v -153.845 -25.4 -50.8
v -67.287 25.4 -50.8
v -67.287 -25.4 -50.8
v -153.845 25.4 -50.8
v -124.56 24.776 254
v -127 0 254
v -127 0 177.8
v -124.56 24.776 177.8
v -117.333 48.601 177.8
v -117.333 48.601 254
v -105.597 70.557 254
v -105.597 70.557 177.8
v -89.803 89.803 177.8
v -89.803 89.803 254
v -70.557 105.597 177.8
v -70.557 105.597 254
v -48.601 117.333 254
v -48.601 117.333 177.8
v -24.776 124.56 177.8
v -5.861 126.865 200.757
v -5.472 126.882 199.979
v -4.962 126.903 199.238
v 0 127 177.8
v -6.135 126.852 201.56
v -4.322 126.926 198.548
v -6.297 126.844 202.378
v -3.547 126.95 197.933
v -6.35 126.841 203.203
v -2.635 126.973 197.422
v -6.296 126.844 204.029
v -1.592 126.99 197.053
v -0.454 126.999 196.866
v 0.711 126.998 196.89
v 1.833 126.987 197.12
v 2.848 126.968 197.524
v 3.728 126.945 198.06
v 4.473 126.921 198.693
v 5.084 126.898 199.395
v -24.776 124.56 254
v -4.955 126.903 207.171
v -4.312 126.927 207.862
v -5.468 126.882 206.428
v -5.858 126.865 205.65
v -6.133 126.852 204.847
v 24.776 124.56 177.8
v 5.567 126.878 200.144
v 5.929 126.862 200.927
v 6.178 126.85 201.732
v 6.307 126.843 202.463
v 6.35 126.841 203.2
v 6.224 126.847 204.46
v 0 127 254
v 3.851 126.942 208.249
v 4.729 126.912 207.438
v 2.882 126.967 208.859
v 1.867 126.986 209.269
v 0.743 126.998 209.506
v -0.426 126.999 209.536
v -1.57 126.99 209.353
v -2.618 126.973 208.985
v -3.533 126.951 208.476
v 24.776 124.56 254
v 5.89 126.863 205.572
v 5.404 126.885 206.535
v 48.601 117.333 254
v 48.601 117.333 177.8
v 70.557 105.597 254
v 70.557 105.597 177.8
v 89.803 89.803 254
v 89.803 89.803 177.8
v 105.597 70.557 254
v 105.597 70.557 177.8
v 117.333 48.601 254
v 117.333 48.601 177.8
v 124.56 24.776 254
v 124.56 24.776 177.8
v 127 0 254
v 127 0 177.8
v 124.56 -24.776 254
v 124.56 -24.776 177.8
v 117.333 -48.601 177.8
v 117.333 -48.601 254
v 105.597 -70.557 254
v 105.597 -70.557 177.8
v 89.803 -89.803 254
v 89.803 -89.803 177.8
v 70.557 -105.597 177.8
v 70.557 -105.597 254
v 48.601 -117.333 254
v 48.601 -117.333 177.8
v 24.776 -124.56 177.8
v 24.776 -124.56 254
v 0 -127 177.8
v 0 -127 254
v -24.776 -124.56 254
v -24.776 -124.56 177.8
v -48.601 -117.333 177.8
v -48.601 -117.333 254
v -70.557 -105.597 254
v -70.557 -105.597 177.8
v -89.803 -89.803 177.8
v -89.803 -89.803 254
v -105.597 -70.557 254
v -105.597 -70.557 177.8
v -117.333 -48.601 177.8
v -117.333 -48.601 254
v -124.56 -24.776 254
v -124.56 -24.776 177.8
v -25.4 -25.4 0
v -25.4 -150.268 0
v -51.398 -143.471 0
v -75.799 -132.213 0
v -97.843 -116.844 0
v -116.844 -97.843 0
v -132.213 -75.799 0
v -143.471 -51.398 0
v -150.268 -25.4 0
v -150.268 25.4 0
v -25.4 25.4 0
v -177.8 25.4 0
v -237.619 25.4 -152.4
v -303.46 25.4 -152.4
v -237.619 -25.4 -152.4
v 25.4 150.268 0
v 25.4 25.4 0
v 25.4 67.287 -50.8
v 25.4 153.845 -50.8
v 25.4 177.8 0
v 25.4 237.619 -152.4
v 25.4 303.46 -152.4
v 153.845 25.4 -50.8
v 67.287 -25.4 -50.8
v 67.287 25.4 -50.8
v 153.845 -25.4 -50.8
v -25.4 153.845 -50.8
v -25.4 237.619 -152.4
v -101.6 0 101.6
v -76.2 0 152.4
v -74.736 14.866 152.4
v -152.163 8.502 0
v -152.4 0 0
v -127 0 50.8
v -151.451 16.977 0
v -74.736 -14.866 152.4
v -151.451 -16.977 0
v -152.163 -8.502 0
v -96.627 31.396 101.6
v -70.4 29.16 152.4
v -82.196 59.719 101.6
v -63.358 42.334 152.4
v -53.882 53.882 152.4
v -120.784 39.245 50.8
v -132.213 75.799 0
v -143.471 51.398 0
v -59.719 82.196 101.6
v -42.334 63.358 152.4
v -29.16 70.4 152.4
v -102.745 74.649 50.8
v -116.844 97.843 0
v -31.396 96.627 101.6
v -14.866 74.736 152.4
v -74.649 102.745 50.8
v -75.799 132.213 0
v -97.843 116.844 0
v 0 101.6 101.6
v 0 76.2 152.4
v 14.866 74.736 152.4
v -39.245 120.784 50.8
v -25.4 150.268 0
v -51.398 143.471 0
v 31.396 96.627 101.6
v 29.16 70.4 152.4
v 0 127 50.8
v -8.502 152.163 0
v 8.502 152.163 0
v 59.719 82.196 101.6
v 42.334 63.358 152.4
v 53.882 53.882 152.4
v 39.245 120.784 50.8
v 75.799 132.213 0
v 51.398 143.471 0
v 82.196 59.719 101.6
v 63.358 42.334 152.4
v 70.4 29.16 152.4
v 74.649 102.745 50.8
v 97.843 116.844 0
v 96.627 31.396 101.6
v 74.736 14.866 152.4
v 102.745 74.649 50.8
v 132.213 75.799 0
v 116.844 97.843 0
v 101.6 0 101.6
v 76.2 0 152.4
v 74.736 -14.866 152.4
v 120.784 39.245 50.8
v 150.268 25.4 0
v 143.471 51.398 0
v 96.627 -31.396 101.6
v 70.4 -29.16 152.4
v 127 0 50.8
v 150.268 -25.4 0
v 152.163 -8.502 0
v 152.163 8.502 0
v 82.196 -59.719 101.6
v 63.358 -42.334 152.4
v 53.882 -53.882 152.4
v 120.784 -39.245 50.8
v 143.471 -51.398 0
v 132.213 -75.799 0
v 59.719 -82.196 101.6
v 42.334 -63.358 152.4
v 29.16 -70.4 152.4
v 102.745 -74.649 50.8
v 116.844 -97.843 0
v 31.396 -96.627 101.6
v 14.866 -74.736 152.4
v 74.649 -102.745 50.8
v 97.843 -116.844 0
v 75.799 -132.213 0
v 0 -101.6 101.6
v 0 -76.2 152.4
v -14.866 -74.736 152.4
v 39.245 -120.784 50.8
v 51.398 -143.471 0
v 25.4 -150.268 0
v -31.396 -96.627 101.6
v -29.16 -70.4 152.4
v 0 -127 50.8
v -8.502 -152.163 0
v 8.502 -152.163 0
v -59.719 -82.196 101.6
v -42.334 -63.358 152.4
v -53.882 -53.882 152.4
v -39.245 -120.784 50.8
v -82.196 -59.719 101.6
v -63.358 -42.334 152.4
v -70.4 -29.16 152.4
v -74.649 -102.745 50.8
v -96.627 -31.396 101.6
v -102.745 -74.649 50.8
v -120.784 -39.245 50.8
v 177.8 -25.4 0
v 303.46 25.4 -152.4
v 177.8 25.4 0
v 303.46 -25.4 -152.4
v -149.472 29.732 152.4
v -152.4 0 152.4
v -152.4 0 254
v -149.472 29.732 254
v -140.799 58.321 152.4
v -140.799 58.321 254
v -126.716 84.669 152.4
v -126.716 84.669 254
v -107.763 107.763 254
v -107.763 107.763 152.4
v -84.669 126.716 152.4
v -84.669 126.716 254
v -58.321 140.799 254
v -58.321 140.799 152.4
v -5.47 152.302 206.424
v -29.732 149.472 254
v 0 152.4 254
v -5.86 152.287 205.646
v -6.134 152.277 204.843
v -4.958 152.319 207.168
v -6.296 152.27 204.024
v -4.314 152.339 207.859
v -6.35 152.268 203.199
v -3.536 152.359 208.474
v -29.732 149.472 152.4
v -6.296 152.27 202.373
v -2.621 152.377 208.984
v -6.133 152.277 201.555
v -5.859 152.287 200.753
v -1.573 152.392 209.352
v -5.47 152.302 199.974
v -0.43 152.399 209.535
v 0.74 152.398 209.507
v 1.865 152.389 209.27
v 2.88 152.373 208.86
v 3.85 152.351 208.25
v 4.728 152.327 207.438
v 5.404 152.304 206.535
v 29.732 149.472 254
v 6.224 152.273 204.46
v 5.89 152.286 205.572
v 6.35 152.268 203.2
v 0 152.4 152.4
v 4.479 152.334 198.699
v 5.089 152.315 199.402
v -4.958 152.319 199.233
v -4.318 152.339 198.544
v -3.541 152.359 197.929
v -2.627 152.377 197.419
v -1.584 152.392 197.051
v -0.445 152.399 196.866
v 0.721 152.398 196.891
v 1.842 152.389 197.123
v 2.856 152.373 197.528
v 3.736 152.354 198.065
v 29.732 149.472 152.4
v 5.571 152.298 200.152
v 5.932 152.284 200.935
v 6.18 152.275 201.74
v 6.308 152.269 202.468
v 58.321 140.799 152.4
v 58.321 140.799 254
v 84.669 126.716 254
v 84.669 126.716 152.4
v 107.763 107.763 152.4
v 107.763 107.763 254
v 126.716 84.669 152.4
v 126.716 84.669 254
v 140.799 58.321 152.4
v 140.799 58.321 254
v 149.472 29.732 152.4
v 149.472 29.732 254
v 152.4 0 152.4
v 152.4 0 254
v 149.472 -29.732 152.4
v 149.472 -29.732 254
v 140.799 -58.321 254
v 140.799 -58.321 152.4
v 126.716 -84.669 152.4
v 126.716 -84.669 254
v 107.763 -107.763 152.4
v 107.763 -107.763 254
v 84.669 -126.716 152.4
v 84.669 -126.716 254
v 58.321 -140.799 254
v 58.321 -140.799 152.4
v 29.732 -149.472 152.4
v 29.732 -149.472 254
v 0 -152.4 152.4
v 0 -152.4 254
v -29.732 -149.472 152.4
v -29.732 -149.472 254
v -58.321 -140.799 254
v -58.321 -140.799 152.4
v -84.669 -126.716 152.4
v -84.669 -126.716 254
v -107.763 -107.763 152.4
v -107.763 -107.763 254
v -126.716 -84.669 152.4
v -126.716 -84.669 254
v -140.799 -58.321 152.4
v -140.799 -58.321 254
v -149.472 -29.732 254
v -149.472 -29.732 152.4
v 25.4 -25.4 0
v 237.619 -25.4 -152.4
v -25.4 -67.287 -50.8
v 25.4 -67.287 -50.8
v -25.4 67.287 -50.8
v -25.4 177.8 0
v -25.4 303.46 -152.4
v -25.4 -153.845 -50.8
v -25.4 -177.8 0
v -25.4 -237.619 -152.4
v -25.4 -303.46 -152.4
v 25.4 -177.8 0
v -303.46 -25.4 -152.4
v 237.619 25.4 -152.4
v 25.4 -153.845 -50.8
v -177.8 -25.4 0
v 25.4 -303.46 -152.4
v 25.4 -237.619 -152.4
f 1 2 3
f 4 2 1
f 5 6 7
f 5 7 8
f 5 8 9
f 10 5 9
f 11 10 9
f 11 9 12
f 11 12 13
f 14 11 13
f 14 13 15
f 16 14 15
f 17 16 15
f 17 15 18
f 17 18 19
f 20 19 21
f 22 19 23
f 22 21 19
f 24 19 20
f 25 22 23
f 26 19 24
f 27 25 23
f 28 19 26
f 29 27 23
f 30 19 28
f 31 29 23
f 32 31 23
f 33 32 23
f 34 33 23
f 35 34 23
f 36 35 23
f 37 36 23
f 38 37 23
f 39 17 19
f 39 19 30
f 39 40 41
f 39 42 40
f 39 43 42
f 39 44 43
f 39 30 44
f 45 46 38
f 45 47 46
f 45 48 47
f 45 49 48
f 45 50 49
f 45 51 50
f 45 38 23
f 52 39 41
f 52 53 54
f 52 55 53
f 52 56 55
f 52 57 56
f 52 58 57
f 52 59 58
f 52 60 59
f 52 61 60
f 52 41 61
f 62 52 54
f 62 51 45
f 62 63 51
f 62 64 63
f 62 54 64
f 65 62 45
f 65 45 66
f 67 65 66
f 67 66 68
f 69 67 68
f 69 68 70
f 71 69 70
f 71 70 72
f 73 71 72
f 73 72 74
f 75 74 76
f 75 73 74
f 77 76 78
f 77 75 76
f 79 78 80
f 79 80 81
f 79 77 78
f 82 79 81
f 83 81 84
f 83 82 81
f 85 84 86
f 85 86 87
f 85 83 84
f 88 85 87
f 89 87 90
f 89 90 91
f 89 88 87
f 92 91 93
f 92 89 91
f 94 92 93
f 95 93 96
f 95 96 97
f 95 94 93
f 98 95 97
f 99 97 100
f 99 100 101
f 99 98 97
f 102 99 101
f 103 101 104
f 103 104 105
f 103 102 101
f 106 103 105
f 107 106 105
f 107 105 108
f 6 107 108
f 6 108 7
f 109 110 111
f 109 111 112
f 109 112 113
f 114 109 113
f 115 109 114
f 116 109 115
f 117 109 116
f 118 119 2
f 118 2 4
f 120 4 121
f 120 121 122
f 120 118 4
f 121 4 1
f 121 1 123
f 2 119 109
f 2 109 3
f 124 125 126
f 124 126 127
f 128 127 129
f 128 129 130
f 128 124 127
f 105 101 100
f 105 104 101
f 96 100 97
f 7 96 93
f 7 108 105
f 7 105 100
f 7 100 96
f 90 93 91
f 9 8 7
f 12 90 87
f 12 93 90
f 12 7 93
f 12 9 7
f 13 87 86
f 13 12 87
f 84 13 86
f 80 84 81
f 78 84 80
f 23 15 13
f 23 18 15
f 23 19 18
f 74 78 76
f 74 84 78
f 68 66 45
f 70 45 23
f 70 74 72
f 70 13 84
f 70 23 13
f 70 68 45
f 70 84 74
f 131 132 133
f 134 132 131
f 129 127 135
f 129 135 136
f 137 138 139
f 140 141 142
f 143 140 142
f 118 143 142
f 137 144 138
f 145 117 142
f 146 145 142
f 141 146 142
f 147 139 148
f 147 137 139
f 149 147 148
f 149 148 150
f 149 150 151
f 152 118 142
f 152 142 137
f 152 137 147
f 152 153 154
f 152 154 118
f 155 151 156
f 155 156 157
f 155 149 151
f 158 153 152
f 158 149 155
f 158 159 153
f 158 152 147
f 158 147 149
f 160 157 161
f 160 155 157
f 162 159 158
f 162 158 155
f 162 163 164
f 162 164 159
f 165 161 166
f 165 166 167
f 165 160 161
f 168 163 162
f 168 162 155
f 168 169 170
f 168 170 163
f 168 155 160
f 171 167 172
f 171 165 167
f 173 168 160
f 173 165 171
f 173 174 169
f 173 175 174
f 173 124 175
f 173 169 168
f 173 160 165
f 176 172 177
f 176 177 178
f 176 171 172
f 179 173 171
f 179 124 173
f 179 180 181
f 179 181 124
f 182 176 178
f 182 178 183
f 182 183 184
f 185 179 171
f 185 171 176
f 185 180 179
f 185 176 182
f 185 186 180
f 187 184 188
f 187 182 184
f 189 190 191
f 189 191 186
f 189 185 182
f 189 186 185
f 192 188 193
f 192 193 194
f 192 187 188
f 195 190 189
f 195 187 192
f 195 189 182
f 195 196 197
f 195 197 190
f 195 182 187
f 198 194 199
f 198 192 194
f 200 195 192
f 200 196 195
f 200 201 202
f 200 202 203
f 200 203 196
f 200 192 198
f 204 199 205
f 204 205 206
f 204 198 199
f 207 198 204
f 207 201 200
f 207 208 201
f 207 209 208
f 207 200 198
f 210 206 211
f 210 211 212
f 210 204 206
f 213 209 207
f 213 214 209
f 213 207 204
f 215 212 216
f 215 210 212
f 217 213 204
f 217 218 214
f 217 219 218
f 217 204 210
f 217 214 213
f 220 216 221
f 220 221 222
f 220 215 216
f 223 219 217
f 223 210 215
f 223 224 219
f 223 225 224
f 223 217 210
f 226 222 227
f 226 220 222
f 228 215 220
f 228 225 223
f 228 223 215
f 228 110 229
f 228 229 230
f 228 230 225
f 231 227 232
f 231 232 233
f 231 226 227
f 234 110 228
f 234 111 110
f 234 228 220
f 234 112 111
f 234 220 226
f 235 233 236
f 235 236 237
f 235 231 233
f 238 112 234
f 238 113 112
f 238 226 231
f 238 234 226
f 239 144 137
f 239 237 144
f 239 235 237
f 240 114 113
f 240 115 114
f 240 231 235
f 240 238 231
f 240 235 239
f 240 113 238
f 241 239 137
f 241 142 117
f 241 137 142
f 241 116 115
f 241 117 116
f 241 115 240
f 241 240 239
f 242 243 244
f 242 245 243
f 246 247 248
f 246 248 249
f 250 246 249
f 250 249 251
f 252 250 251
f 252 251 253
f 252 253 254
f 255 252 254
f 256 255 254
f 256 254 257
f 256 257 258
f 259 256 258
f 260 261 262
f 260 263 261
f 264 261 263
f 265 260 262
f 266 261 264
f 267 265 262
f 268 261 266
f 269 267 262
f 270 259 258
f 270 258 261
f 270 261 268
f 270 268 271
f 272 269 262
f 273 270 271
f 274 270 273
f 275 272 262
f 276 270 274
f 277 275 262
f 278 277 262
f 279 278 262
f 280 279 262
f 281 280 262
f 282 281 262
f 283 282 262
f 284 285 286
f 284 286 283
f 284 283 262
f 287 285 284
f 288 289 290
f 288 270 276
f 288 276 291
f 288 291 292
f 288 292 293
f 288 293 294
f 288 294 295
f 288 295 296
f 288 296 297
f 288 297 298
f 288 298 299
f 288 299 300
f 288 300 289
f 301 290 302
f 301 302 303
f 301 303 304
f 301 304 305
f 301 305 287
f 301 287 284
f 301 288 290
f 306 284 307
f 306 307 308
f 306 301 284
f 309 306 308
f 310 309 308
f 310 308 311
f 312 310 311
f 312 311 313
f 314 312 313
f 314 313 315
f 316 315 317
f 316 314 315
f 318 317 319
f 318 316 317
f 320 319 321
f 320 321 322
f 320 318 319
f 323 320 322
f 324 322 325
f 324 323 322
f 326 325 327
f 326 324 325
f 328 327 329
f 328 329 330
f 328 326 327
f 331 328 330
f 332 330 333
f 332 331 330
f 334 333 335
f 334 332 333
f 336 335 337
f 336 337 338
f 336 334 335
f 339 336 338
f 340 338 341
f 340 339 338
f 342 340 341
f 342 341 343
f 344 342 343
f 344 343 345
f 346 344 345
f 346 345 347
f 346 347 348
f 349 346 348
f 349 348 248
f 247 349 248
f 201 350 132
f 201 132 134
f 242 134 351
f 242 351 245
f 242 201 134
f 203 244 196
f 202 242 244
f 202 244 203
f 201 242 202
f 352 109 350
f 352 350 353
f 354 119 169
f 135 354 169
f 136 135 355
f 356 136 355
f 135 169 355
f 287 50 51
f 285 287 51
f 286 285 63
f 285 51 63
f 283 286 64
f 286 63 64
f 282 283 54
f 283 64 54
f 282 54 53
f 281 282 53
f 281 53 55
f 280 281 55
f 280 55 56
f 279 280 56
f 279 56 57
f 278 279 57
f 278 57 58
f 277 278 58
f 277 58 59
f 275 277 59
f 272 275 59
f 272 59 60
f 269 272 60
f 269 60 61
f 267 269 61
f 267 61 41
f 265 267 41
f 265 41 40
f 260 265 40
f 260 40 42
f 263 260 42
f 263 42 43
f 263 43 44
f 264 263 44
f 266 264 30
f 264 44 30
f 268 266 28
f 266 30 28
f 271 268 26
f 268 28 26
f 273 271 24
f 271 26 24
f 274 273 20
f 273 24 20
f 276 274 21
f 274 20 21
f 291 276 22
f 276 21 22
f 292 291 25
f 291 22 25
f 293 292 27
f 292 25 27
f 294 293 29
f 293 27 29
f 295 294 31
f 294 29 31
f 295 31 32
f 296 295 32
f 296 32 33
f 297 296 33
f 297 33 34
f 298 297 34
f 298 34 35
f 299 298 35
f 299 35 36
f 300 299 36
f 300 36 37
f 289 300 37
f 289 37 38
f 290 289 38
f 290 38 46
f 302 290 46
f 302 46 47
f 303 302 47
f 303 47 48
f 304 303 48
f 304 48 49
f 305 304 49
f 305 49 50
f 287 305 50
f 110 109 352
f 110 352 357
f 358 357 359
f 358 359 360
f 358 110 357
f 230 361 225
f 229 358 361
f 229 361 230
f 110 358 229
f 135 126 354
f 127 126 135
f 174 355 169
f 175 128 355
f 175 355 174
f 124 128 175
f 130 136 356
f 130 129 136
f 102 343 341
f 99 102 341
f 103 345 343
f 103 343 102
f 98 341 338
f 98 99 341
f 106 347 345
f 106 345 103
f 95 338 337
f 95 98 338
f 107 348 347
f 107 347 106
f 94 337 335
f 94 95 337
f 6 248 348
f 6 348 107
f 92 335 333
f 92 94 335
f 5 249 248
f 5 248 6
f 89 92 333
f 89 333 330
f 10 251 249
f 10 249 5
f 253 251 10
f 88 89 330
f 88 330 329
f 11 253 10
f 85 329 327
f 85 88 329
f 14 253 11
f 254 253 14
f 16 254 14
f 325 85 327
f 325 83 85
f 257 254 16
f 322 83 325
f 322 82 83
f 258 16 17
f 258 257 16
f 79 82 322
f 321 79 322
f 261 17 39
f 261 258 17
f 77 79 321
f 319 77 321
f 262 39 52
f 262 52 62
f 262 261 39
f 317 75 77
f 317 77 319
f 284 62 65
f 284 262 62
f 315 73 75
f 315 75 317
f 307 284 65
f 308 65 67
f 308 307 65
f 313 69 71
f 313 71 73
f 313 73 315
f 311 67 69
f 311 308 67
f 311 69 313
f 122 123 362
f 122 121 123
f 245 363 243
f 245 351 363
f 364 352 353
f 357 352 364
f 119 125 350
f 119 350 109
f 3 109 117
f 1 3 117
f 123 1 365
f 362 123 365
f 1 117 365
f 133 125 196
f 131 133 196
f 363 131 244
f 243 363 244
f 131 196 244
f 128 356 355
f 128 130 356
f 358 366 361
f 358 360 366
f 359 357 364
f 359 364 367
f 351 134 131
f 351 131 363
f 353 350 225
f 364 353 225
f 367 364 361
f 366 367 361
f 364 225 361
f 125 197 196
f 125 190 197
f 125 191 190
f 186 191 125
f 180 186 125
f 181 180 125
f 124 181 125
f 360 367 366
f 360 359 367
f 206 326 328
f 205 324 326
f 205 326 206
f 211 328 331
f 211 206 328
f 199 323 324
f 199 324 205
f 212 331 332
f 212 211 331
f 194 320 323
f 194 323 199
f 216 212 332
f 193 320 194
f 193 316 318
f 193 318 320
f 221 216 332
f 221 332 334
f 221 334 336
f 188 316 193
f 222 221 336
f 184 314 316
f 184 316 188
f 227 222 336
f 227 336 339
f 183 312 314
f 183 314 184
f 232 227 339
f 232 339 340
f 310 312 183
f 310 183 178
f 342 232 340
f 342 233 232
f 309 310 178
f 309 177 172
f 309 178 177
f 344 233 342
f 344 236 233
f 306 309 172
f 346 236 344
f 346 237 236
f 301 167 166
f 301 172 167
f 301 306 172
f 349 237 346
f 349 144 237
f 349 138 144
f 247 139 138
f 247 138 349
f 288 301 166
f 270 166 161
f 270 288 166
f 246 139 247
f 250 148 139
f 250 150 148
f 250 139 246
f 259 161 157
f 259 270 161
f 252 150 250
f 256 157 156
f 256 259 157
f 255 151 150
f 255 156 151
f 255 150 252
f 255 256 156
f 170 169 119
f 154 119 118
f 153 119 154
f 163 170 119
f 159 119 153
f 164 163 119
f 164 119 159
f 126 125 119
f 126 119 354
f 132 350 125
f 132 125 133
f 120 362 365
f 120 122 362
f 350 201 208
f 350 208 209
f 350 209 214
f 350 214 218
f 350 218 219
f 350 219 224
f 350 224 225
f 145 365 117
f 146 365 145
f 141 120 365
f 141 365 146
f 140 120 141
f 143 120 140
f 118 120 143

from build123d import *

# Parameters (mm, degrees)
F3_DEPTH = 25.4
F4_COUNT = 4
F5_R     = 6.35
F6_DEPTH = 508


with BuildPart() as f1:
    # F0 (on Front) → F1 (revolve)
    with BuildSketch(Plane.XZ):
        Polygon((-76.2, 152.4), (0, 152.4), (0, 177.8), (-127, 177.8), (-127, 254), (-152.4, 254), (-152.4, 152.4), align=None)
        Polygon((-152.4, 0), (0, 0), (0, 152.4), (-76.2, 152.4), align=None)
    revolve(axis=Axis((0, 0, 76.2), (0, 0, -1)))

    # F2 (on Front) → F3 (join, symmetric)
    with BuildSketch(Plane.XZ):
        Polygon((177.8, 0), (25.4, 0), (67.2867714516, -50.8), (153.8449790805, -50.8), (237.6185219837, -152.4), (303.4603143548, -152.4), align=None)
    extrude(amount=F3_DEPTH, both=True)

    # F4: F1 ×4 about axis
    f4_axis = Axis((0, 0, 152.4), (0, 0, -1))


with BuildPart() as f1_1:
    add(f1.part)
    for i in range(1, F4_COUNT):
        add(f1.part.rotate(f4_axis, i * 360 / F4_COUNT))

    # F5 (on Front) → F6 (cut)
    with BuildSketch(Plane.XZ):
        with Locations((0, 203.2)):
            Circle(F5_R)
    extrude(amount=-F6_DEPTH, mode=Mode.SUBTRACT)


solid = f1_1.part
